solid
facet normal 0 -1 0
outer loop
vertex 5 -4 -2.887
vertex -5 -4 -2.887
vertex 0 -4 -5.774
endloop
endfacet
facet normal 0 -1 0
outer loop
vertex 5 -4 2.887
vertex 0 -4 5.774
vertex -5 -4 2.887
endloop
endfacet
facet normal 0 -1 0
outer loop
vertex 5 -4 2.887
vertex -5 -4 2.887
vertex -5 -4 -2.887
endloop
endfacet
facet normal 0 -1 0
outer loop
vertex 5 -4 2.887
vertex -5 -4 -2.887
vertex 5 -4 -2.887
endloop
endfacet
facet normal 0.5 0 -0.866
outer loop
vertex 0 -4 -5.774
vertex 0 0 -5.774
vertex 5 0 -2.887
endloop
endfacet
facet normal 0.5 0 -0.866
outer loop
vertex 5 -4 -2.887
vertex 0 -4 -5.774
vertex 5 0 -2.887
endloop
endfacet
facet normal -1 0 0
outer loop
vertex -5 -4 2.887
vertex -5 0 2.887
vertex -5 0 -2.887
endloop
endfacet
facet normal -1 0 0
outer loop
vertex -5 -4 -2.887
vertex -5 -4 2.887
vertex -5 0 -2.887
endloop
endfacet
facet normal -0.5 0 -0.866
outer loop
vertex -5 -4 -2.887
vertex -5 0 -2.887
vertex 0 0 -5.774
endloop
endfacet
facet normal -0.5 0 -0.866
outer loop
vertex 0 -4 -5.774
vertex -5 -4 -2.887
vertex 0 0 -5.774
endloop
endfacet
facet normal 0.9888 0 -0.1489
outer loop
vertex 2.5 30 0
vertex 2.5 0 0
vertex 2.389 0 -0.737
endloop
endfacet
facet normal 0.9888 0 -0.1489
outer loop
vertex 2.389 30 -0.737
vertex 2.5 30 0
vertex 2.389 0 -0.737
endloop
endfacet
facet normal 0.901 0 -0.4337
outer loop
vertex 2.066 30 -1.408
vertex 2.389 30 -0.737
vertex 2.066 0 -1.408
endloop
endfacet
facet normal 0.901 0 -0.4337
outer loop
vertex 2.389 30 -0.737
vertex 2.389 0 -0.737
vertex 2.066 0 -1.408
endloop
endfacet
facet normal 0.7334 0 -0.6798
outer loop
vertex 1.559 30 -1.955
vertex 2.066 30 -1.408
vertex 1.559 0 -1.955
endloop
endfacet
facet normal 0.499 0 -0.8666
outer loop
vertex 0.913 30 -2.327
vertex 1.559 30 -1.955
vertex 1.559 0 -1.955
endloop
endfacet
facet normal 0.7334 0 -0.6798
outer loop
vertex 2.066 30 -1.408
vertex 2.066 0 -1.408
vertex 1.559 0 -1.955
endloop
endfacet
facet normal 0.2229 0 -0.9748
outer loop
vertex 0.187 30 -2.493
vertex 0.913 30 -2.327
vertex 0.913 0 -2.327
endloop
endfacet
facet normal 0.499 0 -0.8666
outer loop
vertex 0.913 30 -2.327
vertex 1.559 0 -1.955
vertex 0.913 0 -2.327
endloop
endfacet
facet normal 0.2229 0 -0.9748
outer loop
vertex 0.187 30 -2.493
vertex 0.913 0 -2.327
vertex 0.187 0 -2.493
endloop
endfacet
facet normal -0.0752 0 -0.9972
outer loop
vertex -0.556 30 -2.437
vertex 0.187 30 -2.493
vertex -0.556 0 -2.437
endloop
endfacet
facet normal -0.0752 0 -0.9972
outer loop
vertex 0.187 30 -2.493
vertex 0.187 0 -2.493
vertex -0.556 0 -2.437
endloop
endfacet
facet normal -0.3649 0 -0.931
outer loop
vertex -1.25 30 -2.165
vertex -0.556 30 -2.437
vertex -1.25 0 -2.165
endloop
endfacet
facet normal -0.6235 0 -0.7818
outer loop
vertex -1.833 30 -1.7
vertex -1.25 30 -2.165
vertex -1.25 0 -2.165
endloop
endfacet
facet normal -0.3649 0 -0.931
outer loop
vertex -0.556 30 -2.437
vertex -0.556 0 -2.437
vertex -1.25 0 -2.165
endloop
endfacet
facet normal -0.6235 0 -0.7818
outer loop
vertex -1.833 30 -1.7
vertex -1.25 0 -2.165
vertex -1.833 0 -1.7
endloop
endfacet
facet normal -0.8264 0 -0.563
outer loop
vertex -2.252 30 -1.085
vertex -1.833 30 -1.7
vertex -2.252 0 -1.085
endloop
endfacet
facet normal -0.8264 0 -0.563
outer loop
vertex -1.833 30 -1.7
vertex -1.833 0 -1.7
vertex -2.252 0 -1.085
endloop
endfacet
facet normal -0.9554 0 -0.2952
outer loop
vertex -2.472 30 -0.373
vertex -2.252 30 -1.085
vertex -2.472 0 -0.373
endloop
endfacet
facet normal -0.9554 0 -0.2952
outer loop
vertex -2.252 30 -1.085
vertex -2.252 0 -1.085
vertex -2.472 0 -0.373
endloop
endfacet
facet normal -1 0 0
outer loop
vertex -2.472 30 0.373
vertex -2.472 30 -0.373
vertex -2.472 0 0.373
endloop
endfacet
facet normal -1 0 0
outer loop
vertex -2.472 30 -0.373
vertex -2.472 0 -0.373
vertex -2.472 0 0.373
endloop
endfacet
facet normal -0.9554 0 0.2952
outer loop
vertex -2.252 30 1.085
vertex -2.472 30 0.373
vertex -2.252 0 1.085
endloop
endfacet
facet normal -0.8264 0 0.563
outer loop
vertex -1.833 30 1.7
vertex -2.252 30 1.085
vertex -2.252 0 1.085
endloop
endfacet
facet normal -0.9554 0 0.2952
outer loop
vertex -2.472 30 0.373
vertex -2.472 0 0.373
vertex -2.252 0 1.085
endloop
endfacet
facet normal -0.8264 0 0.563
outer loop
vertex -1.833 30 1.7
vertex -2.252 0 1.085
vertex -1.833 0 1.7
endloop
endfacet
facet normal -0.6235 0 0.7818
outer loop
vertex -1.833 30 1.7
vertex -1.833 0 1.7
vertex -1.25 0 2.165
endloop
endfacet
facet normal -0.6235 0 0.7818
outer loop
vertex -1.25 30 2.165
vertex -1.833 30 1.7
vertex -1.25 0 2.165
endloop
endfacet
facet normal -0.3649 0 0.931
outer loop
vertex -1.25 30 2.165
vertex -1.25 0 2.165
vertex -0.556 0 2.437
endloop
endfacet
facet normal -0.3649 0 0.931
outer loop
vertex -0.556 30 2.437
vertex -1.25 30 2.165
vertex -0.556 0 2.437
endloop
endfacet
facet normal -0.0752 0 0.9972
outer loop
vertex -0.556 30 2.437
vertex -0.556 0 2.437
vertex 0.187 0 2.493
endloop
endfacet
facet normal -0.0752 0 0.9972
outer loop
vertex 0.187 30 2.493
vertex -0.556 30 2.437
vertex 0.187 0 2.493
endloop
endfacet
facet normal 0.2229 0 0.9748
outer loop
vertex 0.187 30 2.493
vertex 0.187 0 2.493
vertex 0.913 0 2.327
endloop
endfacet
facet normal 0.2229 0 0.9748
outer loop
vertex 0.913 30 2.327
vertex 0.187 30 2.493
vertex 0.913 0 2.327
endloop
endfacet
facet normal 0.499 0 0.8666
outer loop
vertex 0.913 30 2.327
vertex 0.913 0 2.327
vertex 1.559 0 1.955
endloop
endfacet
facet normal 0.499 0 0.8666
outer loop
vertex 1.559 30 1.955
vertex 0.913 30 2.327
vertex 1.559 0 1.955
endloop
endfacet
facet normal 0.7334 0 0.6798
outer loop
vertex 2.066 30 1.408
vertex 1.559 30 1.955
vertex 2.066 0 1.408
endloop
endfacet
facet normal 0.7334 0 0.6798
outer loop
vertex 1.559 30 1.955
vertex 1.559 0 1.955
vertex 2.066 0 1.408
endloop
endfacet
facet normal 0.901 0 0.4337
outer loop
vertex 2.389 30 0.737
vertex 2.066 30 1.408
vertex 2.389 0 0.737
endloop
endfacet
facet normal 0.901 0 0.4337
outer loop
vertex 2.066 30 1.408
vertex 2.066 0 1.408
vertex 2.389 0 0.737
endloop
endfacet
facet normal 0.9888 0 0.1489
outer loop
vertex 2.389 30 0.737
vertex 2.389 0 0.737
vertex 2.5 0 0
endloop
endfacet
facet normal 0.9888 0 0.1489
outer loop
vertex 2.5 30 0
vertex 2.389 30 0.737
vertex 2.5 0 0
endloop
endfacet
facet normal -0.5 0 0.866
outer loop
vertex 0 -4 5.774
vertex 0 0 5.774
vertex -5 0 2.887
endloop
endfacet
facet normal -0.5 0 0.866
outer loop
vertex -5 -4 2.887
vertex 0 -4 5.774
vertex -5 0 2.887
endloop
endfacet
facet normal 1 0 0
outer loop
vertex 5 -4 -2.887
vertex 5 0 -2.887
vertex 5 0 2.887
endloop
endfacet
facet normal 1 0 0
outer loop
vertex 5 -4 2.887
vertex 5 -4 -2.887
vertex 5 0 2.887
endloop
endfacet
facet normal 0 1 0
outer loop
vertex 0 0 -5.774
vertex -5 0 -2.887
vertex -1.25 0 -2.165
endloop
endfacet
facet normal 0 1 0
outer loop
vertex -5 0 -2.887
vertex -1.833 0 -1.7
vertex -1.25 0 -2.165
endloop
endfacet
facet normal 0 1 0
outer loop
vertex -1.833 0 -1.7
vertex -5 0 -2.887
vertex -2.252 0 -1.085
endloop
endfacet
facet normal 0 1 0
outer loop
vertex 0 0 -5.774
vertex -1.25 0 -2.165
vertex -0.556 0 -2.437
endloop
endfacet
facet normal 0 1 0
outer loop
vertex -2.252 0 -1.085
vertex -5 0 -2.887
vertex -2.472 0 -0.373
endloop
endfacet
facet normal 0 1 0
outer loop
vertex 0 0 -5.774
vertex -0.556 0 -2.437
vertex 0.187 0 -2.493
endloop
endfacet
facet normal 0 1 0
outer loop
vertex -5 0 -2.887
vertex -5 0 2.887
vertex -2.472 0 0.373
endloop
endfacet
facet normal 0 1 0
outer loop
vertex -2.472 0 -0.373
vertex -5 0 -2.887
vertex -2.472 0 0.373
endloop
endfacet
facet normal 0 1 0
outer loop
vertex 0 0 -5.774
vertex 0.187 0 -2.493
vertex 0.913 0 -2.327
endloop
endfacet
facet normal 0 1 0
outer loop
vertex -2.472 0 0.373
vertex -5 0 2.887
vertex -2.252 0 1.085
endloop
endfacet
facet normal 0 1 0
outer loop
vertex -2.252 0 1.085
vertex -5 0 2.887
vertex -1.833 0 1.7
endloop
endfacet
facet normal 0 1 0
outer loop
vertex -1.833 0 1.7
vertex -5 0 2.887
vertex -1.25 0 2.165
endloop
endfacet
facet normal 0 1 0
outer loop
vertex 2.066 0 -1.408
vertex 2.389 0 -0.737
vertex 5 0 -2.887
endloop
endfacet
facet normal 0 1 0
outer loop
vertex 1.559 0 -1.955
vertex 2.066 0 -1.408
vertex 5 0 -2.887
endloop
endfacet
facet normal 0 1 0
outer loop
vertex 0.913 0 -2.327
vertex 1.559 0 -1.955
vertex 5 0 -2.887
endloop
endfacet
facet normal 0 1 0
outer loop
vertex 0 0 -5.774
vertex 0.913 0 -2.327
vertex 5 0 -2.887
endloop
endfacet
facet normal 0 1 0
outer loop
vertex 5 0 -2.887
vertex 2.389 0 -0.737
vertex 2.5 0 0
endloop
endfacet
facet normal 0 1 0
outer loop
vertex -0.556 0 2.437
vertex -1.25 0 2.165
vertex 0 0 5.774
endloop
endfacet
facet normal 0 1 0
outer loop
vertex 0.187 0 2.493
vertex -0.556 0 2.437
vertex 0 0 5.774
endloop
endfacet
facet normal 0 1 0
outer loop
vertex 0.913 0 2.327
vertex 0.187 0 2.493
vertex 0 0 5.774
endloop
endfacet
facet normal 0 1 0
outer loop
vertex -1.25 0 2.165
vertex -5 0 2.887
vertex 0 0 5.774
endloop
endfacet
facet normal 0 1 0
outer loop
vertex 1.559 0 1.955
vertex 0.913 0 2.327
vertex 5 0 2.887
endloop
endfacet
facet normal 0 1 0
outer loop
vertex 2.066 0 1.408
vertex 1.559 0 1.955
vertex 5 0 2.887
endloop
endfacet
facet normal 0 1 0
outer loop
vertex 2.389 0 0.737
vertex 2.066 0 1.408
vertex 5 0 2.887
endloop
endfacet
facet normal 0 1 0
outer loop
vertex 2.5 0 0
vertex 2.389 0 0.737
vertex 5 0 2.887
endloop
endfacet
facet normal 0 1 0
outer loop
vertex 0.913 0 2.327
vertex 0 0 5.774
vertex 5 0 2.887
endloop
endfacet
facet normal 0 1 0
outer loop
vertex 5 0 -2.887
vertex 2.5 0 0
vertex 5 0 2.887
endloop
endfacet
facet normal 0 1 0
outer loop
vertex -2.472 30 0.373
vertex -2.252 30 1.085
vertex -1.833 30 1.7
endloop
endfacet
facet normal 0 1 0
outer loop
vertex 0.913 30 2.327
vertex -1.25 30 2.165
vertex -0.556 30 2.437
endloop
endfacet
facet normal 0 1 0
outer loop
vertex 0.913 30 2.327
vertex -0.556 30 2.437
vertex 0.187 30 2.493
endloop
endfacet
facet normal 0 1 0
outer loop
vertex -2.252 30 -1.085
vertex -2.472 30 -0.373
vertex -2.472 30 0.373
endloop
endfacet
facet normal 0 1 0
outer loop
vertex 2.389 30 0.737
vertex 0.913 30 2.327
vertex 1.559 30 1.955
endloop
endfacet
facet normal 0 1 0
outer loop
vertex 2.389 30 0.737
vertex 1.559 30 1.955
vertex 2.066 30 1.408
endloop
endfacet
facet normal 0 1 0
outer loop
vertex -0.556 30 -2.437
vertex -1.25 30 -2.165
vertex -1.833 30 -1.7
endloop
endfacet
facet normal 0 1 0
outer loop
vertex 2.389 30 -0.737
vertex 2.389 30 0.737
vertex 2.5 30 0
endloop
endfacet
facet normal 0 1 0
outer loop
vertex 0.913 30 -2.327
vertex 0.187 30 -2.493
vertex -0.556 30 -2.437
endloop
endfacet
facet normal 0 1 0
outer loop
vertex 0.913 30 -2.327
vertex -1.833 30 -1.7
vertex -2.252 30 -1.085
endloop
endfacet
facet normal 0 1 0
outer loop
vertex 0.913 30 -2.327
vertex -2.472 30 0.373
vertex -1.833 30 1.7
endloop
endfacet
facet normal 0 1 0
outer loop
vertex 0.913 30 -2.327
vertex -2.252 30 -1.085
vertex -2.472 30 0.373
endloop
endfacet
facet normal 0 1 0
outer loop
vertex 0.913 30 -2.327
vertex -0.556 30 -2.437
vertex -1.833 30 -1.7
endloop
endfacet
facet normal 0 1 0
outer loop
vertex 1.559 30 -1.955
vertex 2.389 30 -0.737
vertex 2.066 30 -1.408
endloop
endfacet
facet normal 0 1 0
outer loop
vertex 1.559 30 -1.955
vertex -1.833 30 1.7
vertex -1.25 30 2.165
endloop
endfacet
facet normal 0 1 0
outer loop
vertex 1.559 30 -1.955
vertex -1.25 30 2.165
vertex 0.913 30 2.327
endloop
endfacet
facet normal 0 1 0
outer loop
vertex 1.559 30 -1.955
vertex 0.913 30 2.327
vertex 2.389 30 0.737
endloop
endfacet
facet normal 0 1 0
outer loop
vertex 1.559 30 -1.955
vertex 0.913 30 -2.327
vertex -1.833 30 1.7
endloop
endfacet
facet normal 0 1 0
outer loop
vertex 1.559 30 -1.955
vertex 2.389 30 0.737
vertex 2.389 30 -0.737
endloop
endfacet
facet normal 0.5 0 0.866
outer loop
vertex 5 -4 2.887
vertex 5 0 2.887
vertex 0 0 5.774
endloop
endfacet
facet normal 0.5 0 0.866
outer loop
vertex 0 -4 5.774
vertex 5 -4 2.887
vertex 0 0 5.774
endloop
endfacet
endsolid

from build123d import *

# Parameters (mm, degrees)
SKETCH1_R           = 2.5
BOSS_EXTRUDE1_DEPTH = 30
BOSS_EXTRUDE2_DEPTH = 4


with BuildPart() as part:
    # Sketch1 → Boss-Extrude1 (new body)
    with BuildSketch(Plane(origin=(0, 0, 0), x_dir=(1, 0, 0), z_dir=(0, 1, 0))):
        Circle(SKETCH1_R)
    extrude(amount=BOSS_EXTRUDE1_DEPTH)

    # Sketch2 → Boss-Extrude2 (add)
    with BuildSketch(Plane.XZ):
        Polygon((0, 5.773502692), (-5, 2.886751346), (-5, -2.886751346), (0, -5.773502692), (5, -2.886751346), (5, 2.886751346), align=None)
    extrude(amount=BOSS_EXTRUDE2_DEPTH)


solid = part.part
